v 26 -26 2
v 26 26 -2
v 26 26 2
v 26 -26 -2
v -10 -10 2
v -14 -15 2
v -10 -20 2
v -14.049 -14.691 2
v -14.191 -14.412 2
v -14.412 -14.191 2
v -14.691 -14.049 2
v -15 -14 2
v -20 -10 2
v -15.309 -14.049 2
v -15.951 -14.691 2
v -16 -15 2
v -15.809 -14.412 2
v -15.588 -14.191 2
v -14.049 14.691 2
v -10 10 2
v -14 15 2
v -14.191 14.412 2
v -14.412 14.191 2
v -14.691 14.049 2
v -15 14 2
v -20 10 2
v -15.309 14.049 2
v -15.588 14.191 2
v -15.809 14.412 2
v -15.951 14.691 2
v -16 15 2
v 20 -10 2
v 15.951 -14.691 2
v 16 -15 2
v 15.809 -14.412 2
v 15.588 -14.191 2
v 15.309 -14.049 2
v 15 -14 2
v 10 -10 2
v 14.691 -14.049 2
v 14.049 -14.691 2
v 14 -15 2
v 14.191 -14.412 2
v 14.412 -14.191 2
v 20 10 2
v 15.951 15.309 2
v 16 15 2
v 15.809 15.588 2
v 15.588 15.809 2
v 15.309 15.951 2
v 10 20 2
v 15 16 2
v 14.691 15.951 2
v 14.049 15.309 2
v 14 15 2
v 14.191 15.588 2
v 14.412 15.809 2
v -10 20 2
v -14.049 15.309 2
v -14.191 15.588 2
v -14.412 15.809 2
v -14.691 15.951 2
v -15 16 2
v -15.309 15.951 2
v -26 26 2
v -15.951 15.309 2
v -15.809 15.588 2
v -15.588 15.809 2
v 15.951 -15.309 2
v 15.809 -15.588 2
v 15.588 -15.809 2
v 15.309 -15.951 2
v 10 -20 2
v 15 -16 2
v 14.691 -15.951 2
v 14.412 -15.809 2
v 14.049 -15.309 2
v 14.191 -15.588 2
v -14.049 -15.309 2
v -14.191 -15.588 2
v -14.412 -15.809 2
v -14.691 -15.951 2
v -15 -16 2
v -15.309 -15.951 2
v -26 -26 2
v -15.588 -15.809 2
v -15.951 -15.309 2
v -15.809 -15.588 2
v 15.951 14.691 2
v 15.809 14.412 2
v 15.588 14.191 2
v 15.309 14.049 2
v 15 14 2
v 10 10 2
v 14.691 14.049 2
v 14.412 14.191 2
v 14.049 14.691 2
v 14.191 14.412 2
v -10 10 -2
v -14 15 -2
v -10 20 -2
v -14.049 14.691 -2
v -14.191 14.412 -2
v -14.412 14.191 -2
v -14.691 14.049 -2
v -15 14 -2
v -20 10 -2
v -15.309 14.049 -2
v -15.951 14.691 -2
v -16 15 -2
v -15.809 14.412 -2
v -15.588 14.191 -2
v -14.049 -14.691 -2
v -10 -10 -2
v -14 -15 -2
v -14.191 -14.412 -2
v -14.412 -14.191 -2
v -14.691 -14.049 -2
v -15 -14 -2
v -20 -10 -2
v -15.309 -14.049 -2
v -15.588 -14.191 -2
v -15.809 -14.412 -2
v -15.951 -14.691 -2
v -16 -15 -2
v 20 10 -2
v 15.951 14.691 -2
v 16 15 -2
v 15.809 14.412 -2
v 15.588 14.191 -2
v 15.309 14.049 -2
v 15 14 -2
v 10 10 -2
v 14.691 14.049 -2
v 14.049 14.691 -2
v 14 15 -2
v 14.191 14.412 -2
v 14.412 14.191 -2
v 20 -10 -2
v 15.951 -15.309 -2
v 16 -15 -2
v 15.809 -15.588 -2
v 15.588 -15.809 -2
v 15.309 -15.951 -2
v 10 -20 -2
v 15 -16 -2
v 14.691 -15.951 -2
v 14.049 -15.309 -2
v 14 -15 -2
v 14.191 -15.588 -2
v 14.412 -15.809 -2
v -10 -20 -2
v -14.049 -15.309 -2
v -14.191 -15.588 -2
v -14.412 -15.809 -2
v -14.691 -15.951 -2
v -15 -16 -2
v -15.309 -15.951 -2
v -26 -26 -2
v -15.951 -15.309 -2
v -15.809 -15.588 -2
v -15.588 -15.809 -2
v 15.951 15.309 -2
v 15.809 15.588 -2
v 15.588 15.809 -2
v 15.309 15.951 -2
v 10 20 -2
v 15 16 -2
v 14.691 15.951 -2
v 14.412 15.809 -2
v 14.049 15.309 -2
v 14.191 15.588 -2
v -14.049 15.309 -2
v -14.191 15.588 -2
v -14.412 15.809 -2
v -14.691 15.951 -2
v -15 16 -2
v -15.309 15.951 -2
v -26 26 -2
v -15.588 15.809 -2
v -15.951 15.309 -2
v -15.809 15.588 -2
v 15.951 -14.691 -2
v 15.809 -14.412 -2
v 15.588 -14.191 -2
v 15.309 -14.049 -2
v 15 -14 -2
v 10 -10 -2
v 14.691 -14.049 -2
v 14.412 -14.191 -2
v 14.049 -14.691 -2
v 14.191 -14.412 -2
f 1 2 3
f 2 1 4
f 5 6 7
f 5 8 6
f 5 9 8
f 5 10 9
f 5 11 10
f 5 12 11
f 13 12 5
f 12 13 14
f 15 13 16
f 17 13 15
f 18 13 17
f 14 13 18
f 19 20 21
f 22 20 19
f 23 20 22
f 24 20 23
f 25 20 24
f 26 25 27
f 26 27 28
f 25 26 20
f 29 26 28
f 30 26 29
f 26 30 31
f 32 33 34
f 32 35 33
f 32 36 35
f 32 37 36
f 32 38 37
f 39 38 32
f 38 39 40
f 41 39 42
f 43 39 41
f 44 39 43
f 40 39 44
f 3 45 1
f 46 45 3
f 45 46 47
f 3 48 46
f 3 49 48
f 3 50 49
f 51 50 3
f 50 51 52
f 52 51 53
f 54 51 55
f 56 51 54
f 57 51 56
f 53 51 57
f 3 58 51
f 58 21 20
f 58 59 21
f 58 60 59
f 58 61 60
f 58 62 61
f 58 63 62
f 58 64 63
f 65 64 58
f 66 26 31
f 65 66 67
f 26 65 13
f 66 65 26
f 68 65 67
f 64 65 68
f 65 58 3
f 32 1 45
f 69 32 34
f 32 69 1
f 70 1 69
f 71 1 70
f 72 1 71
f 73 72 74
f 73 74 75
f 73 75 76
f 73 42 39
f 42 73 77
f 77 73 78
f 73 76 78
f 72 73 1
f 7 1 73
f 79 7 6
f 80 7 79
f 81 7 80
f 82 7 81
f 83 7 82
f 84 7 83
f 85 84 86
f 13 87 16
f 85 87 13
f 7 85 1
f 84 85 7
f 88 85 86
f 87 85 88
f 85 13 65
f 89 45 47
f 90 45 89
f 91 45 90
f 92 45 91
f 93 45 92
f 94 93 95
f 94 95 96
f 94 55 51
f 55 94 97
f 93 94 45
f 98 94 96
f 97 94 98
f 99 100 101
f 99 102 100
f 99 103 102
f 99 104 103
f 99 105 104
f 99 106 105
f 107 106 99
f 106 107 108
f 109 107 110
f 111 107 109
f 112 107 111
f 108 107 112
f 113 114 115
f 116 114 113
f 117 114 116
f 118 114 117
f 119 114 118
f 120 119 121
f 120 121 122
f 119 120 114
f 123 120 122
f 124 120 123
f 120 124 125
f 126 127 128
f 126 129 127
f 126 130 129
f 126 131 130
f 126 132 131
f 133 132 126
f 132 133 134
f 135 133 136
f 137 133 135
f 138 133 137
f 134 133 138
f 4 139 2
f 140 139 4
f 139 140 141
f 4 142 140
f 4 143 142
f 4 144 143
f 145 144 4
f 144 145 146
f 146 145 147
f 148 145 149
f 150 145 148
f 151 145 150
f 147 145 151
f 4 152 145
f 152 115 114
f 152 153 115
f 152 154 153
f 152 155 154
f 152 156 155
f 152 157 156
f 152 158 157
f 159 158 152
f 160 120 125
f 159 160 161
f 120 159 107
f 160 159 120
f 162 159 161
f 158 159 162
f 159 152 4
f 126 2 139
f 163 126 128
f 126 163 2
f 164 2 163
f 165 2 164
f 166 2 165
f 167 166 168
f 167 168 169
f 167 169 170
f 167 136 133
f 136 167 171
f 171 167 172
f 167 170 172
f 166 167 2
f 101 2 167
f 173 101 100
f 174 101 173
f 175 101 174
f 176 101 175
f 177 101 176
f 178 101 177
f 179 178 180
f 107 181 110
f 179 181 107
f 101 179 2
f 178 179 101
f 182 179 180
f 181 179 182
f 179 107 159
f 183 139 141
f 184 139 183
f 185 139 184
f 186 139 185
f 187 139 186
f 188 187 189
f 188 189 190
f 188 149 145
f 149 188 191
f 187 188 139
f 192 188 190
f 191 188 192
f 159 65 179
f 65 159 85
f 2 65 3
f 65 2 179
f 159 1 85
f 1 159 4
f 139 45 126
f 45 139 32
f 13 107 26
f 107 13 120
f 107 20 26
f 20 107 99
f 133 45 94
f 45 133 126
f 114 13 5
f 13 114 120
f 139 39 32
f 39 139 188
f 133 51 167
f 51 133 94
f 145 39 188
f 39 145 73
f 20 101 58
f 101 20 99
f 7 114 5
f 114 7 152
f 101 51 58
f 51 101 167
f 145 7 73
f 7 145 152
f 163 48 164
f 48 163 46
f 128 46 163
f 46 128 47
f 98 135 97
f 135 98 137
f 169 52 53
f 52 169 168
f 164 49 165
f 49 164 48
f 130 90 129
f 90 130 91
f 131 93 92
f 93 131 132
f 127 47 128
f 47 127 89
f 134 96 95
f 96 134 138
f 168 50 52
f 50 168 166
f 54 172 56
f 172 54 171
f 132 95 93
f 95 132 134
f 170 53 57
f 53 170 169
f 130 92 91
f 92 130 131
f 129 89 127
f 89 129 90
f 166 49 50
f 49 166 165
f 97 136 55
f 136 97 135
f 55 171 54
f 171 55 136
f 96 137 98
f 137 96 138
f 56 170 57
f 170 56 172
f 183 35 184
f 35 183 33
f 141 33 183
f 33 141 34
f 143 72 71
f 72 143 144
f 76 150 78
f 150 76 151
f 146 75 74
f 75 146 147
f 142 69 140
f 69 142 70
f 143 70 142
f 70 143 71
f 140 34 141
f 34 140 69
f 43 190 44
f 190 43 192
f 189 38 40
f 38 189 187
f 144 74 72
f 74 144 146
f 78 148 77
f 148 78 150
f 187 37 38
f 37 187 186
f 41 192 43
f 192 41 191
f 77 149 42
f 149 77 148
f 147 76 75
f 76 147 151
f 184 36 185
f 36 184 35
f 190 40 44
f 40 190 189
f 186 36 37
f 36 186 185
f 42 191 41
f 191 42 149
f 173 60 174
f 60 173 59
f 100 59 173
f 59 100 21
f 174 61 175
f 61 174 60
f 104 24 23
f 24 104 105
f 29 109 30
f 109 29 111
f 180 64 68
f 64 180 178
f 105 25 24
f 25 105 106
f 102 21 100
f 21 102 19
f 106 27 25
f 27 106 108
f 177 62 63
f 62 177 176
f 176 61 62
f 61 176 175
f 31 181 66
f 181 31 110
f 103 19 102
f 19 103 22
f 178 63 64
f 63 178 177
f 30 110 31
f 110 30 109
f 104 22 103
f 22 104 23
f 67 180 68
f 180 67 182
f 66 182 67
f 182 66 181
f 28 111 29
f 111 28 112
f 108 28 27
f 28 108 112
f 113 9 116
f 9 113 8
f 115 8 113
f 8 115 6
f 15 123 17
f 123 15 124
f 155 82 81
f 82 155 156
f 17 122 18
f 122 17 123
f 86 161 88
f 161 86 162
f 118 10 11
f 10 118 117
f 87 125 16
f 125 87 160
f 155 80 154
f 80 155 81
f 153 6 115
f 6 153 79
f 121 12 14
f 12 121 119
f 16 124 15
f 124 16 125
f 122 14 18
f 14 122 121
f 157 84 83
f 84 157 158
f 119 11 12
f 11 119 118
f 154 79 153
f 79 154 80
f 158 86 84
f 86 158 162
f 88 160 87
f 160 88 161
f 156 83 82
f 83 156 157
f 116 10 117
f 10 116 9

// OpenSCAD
//-------------------------------------------------------------------------
//-- base.scad
//-------------------------------------------------------------------------
//--This file has been generated automatically according to your data.
//--For more info, visit: http://iearobotics.com/oomlwiki/
//--------------------------------------------------------------------------

difference() {
  cube(size=[52.000, 52.000, 4.000], center=true);
  cube(size=[40.000, 20.000, 4.100], center=true);
  cube(size=[20.000, 40.000, 4.100], center=true);
  translate(v=[15.000, 15.000, 0.000]) {
    cylinder(h=4.100, r1=1.000, r2=1.000, $fn=20, center=true);
  } // End translate
  translate(v=[15.000, -15.000, 0.000]) {
    cylinder(h=4.100, r1=1.000, r2=1.000, $fn=20, center=true);
  } // End translate
  translate(v=[-15.000, 15.000, 0.000]) {
    cylinder(h=4.100, r1=1.000, r2=1.000, $fn=20, center=true);
  } // End translate
  translate(v=[-15.000, -15.000, 0.000]) {
    cylinder(h=4.100, r1=1.000, r2=1.000, $fn=20, center=true);
  } // End translate
} // End difference
